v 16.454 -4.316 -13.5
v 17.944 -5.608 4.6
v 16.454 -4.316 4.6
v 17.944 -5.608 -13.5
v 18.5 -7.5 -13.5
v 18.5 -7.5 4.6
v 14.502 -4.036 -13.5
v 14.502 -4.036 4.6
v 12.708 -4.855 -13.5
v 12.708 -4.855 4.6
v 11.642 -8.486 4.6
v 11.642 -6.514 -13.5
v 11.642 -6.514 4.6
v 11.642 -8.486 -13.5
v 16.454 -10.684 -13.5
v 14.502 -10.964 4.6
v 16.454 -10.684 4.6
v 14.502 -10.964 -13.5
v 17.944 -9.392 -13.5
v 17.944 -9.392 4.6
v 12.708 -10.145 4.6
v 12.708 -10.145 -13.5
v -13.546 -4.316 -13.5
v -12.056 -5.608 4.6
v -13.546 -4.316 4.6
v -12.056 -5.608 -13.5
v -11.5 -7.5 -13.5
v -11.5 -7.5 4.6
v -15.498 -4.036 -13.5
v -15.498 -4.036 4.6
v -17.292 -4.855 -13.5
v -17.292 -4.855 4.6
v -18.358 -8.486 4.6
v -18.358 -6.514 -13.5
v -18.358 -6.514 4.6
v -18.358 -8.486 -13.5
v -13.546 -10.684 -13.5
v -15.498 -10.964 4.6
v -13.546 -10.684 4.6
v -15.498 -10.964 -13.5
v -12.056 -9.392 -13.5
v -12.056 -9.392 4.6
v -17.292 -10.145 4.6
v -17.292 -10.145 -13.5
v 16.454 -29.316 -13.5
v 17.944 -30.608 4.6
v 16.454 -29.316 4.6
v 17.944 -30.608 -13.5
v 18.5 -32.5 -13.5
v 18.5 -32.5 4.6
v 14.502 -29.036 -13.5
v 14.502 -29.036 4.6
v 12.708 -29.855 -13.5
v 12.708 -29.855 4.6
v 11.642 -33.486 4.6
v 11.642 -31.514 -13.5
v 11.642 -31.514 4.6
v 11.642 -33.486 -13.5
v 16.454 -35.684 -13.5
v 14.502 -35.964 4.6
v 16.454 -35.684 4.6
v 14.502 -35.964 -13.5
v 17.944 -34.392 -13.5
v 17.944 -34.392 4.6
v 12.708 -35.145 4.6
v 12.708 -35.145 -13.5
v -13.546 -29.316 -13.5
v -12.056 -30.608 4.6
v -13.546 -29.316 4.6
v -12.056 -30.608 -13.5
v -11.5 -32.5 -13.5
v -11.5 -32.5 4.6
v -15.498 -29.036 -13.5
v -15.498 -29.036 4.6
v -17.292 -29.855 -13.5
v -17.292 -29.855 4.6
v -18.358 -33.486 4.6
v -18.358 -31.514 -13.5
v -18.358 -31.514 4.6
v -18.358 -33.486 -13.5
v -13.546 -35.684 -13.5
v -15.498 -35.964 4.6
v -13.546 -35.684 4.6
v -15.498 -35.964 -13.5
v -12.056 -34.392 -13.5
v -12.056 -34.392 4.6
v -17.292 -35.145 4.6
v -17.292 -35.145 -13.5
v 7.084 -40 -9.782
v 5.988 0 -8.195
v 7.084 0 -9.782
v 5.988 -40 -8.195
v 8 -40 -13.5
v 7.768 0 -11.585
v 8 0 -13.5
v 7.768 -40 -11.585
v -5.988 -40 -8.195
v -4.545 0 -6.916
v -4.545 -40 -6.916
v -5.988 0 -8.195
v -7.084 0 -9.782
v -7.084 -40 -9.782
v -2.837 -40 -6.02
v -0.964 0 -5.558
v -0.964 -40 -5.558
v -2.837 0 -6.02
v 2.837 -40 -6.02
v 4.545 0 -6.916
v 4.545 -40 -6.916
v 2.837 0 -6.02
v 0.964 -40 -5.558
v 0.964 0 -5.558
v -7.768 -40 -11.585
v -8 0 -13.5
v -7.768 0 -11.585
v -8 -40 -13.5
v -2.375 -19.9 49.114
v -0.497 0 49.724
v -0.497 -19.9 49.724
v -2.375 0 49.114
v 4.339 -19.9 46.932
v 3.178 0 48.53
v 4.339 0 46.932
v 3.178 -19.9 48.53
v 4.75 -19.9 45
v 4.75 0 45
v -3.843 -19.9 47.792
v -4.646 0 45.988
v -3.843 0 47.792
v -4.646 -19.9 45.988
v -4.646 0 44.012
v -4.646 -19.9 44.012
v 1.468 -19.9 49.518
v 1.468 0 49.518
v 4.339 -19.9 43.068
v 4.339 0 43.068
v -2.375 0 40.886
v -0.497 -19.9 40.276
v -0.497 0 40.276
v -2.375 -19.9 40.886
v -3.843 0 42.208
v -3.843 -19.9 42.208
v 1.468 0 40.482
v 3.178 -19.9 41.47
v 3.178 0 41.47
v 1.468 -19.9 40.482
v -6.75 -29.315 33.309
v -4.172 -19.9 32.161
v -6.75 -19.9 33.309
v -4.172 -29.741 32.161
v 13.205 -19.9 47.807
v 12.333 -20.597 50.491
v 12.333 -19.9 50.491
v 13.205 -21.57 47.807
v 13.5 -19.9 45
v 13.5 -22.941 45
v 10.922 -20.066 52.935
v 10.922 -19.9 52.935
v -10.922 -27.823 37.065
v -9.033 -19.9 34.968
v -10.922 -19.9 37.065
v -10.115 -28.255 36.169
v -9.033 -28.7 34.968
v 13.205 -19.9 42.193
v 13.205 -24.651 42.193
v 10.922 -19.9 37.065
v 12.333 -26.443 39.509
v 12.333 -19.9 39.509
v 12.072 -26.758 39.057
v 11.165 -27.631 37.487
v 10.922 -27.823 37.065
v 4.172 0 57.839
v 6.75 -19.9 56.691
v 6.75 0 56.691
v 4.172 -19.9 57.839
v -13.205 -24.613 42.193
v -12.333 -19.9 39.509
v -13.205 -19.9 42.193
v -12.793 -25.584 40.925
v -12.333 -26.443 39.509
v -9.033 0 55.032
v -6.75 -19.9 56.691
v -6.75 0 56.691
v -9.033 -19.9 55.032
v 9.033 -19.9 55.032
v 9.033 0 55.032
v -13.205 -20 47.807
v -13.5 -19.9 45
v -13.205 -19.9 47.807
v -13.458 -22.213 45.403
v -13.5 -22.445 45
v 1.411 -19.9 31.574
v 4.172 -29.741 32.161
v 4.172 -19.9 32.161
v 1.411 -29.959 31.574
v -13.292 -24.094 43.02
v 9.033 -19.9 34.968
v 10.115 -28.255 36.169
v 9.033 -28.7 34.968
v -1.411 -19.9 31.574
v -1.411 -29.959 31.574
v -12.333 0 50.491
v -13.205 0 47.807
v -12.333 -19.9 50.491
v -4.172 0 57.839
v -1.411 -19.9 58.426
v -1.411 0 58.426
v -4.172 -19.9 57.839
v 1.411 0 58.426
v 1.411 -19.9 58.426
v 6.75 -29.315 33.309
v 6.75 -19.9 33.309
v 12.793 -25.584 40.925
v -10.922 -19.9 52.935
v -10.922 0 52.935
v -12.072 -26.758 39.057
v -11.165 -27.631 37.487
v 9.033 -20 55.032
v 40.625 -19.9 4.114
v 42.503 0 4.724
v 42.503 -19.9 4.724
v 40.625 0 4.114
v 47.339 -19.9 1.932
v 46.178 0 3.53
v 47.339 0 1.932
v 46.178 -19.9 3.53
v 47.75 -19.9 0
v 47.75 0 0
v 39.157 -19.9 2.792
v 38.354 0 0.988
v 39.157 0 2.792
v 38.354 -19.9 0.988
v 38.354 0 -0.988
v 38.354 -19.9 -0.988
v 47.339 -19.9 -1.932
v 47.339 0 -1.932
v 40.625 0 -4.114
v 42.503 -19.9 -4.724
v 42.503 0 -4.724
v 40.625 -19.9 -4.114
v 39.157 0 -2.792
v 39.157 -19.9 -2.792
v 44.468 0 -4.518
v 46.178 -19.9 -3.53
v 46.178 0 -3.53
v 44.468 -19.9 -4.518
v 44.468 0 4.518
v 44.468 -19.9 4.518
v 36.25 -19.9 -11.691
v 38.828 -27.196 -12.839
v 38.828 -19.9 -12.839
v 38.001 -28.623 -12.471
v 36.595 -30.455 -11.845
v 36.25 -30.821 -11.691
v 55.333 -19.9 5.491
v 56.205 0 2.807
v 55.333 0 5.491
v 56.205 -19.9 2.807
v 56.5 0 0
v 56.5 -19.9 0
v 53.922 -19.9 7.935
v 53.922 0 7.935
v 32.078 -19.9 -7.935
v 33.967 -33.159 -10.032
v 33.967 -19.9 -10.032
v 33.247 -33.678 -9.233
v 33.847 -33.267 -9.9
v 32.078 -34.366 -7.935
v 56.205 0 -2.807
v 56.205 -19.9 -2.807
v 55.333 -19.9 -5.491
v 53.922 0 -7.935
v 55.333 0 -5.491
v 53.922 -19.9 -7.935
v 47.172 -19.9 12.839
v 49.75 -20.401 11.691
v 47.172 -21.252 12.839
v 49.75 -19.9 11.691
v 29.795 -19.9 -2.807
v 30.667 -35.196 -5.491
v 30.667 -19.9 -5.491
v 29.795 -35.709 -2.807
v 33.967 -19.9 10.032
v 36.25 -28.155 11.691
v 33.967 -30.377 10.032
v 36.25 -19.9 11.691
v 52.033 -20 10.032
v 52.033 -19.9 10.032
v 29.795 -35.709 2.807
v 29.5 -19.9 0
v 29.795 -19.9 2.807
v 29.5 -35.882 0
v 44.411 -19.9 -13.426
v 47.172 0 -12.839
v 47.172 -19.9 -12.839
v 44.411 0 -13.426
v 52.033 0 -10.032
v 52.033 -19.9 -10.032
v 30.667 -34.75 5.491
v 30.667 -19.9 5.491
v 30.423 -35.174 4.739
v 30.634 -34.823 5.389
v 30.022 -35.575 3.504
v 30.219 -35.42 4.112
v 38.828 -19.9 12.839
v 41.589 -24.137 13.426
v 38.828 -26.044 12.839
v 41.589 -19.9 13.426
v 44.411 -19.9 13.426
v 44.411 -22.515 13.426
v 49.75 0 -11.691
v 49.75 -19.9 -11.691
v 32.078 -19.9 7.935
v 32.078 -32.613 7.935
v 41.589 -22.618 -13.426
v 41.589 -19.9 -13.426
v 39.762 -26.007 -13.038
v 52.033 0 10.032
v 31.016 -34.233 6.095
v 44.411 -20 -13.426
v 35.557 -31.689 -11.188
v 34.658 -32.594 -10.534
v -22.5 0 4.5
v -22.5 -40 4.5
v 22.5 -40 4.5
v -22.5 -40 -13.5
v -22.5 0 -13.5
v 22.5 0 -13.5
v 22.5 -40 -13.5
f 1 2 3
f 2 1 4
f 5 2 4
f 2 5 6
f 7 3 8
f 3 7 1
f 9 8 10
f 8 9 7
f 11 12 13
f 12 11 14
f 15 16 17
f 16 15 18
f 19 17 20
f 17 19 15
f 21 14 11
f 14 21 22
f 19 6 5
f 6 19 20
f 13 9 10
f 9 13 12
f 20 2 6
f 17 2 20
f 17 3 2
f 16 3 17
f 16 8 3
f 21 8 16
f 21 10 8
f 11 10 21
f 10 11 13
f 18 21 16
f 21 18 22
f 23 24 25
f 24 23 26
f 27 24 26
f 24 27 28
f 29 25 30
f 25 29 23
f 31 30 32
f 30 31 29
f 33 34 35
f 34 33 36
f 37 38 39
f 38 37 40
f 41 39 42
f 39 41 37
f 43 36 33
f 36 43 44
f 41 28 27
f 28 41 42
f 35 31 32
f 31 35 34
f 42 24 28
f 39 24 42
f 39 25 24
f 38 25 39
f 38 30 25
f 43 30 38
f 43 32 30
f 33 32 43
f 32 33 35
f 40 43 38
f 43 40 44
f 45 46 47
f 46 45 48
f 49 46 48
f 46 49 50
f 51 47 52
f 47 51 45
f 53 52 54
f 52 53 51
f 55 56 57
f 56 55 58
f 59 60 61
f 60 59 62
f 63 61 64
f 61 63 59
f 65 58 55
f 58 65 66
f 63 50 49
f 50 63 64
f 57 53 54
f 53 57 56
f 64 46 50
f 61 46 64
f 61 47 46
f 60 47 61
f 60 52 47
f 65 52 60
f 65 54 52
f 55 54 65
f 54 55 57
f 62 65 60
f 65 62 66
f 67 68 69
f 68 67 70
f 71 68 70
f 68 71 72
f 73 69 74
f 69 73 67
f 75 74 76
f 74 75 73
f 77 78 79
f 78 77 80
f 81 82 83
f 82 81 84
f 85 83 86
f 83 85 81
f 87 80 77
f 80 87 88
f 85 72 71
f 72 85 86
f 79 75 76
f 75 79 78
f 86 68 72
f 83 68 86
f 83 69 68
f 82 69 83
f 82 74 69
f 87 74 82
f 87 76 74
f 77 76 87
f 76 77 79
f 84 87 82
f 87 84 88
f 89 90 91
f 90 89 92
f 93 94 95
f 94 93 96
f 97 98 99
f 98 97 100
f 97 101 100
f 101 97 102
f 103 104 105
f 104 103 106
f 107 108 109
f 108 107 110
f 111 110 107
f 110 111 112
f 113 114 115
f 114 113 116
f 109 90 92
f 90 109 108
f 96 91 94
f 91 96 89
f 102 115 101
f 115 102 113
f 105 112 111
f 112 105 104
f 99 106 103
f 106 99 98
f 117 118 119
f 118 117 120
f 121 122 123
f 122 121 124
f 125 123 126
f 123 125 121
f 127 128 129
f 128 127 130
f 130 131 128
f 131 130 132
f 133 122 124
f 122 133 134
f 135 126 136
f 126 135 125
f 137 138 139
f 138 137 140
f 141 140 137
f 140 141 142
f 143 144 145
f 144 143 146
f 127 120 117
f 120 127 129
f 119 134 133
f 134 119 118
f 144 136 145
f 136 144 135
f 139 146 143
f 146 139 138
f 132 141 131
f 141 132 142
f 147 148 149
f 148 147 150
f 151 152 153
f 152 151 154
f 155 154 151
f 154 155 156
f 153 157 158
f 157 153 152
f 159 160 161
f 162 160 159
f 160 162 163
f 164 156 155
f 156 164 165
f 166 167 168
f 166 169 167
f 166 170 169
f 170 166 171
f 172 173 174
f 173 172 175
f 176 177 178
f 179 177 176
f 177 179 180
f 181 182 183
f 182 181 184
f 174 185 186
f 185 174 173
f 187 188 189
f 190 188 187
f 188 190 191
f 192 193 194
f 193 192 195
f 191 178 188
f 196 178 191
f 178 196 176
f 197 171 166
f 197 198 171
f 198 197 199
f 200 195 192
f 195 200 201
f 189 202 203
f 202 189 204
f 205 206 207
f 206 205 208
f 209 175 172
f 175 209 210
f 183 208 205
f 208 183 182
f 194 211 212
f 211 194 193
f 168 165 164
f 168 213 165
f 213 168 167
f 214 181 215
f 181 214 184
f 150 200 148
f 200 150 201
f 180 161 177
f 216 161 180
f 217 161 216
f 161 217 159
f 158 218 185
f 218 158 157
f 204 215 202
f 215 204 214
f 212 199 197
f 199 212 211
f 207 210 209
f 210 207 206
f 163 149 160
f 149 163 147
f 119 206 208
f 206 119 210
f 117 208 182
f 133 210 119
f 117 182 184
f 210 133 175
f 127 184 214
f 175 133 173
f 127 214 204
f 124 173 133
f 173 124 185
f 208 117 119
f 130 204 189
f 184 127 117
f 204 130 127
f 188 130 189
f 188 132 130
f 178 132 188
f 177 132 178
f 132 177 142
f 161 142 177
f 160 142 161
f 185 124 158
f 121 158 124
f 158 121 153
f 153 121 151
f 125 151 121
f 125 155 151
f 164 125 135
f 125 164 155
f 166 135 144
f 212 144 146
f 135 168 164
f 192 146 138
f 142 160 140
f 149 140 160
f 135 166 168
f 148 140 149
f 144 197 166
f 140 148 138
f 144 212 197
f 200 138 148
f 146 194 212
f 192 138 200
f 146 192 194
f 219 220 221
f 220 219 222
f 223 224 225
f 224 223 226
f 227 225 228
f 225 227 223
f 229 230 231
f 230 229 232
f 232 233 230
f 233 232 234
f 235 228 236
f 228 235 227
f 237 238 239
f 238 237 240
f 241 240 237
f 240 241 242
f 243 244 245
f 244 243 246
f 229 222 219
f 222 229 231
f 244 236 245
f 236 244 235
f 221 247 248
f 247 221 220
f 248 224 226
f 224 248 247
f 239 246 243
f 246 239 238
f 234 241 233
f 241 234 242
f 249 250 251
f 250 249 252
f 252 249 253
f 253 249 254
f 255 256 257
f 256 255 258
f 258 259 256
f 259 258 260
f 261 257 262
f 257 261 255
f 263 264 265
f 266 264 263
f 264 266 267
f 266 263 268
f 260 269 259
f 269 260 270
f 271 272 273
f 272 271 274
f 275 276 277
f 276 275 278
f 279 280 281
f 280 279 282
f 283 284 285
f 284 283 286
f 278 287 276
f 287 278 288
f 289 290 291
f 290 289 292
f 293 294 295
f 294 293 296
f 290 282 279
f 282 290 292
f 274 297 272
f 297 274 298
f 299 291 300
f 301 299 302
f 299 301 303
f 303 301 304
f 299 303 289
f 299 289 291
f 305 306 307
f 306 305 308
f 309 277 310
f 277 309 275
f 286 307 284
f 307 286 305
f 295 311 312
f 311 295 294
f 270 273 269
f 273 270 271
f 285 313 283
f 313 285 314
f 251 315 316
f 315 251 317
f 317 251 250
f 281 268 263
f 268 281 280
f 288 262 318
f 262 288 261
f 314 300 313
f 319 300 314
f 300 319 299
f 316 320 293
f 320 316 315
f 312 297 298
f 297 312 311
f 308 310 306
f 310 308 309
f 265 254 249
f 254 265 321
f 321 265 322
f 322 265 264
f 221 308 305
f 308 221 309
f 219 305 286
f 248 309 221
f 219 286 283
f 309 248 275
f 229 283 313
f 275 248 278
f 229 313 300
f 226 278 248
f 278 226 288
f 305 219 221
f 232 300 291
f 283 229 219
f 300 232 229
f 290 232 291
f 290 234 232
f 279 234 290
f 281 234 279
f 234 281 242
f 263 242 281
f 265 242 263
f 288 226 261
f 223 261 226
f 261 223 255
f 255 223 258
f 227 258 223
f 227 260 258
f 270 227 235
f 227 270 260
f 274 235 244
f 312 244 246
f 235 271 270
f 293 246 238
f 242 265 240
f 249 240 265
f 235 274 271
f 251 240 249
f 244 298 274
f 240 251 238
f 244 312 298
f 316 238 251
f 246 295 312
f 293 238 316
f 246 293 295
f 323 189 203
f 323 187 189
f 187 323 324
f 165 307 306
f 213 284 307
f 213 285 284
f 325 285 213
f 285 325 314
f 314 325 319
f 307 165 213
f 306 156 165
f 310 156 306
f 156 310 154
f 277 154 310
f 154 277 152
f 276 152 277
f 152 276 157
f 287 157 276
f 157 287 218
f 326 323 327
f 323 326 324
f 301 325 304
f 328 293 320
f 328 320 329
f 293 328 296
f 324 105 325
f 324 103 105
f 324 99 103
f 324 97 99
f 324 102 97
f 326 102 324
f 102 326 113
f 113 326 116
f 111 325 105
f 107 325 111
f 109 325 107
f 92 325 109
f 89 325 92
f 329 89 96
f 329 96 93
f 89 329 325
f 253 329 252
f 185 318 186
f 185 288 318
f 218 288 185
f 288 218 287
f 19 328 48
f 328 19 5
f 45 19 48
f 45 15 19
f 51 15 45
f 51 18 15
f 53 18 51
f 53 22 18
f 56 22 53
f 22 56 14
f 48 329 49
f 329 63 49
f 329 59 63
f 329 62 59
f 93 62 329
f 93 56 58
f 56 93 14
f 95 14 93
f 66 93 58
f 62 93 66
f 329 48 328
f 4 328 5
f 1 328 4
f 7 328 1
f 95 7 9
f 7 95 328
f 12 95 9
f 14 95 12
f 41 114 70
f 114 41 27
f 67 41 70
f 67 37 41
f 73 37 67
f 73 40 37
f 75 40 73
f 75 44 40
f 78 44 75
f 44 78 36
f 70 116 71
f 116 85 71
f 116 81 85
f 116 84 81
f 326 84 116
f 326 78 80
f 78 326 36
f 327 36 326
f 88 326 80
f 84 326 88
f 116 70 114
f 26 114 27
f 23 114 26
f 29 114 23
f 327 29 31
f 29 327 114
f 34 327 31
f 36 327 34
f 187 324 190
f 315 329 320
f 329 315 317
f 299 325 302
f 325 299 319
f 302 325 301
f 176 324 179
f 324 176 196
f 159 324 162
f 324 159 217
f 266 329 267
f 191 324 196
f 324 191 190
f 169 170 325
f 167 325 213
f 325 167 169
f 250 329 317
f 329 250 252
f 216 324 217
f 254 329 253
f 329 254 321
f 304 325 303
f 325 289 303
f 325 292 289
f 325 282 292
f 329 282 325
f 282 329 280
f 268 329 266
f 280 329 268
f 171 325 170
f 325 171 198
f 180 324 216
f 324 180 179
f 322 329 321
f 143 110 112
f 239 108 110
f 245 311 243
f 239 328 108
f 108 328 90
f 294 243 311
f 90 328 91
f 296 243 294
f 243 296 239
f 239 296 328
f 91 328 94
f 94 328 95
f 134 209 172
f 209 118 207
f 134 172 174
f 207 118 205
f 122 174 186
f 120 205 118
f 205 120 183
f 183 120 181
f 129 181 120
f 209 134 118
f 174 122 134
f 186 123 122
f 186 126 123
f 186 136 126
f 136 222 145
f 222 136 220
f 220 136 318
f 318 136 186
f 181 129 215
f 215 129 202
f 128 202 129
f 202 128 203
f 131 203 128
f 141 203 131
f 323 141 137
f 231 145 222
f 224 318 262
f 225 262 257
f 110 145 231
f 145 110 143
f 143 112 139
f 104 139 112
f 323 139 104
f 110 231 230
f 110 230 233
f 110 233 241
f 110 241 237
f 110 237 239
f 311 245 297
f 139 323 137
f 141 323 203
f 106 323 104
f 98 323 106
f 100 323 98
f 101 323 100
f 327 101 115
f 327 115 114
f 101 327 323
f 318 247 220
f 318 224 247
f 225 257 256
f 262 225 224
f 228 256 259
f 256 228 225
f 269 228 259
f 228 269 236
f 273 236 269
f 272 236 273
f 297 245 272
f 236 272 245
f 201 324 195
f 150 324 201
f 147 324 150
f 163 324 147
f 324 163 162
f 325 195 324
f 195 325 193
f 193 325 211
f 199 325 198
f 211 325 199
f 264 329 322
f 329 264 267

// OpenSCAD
// mb == mower_bolt
mb=9.5;
mb_h=20;
mb_base=27;
mb_head=27;
pad=0.1;
padd=pad*2;

one_x=0;
one_y=45;
two_x=43;
two_y=0;

module base_neg() {
    rotate([90,0,0]) {
        translate([one_x,one_y,-pad]) {
            cylinder(d=mb,h=mb_h+padd);
            translate([0,0,mb_h])
            cylinder(d=mb_head,h=mb_h+padd);
        }
        translate([two_x,two_y,-pad]) {
            cylinder(d=mb,h=mb_h+padd);
            translate([0,0,mb_h])
            cylinder(d=mb_head,h=mb_h+padd);
        }
    }
}
module base_pos() {
    rotate([90,0,0]) {
        translate([one_x,one_y,0])
        mb_pos();
        translate([two_x,two_y,0])
        mb_pos();
    }
}
module mb_pos() {
    cylinder(d1=mb_base,d2=mb_head,h=mb_h);
}


axle=16;
//ab = axle_bolt
ab=7;
ab_h=18;
ab_gap_x=30;
ab_gap_y=25;

a_x=45;
a_y=40;
a_h=ab_h;

difference() {
    union() {
    hull() {
        base_pos();
        translate([0,-a_y/2,-mb_base/2])
        translate([-a_x/2,-a_y/2,0])
        cube([a_x,a_y,a_h]);
    }
    }
    ab_neg();
    base_neg();
}


module ab_neg() {
    translate([0,-a_y/2,-mb_base/2])
    translate([0,-a_y/2-pad,0])
    rotate([-90,0,0])
    cylinder(h=a_y+padd,d=axle);
    //translate([-a_x/2-pad,-a_y/2-pad,-a_h])
    //cube([a_x+padd,a_y+padd,a_h]);
    translate([0,-a_y/2,-mb_base/2])
    translate([-ab_gap_x/2,-ab_gap_y/2,-pad]) {
        translate([ab_gap_x,ab_gap_y,0])
        cylinder(d=ab,h=ab_h+padd);
        translate([0,ab_gap_y,0])
        cylinder(d=ab,h=ab_h+padd);
        translate([ab_gap_x,0,0])
        cylinder(d=ab,h=ab_h+padd);
        cylinder(d=ab,h=ab_h+padd);

    }
}
